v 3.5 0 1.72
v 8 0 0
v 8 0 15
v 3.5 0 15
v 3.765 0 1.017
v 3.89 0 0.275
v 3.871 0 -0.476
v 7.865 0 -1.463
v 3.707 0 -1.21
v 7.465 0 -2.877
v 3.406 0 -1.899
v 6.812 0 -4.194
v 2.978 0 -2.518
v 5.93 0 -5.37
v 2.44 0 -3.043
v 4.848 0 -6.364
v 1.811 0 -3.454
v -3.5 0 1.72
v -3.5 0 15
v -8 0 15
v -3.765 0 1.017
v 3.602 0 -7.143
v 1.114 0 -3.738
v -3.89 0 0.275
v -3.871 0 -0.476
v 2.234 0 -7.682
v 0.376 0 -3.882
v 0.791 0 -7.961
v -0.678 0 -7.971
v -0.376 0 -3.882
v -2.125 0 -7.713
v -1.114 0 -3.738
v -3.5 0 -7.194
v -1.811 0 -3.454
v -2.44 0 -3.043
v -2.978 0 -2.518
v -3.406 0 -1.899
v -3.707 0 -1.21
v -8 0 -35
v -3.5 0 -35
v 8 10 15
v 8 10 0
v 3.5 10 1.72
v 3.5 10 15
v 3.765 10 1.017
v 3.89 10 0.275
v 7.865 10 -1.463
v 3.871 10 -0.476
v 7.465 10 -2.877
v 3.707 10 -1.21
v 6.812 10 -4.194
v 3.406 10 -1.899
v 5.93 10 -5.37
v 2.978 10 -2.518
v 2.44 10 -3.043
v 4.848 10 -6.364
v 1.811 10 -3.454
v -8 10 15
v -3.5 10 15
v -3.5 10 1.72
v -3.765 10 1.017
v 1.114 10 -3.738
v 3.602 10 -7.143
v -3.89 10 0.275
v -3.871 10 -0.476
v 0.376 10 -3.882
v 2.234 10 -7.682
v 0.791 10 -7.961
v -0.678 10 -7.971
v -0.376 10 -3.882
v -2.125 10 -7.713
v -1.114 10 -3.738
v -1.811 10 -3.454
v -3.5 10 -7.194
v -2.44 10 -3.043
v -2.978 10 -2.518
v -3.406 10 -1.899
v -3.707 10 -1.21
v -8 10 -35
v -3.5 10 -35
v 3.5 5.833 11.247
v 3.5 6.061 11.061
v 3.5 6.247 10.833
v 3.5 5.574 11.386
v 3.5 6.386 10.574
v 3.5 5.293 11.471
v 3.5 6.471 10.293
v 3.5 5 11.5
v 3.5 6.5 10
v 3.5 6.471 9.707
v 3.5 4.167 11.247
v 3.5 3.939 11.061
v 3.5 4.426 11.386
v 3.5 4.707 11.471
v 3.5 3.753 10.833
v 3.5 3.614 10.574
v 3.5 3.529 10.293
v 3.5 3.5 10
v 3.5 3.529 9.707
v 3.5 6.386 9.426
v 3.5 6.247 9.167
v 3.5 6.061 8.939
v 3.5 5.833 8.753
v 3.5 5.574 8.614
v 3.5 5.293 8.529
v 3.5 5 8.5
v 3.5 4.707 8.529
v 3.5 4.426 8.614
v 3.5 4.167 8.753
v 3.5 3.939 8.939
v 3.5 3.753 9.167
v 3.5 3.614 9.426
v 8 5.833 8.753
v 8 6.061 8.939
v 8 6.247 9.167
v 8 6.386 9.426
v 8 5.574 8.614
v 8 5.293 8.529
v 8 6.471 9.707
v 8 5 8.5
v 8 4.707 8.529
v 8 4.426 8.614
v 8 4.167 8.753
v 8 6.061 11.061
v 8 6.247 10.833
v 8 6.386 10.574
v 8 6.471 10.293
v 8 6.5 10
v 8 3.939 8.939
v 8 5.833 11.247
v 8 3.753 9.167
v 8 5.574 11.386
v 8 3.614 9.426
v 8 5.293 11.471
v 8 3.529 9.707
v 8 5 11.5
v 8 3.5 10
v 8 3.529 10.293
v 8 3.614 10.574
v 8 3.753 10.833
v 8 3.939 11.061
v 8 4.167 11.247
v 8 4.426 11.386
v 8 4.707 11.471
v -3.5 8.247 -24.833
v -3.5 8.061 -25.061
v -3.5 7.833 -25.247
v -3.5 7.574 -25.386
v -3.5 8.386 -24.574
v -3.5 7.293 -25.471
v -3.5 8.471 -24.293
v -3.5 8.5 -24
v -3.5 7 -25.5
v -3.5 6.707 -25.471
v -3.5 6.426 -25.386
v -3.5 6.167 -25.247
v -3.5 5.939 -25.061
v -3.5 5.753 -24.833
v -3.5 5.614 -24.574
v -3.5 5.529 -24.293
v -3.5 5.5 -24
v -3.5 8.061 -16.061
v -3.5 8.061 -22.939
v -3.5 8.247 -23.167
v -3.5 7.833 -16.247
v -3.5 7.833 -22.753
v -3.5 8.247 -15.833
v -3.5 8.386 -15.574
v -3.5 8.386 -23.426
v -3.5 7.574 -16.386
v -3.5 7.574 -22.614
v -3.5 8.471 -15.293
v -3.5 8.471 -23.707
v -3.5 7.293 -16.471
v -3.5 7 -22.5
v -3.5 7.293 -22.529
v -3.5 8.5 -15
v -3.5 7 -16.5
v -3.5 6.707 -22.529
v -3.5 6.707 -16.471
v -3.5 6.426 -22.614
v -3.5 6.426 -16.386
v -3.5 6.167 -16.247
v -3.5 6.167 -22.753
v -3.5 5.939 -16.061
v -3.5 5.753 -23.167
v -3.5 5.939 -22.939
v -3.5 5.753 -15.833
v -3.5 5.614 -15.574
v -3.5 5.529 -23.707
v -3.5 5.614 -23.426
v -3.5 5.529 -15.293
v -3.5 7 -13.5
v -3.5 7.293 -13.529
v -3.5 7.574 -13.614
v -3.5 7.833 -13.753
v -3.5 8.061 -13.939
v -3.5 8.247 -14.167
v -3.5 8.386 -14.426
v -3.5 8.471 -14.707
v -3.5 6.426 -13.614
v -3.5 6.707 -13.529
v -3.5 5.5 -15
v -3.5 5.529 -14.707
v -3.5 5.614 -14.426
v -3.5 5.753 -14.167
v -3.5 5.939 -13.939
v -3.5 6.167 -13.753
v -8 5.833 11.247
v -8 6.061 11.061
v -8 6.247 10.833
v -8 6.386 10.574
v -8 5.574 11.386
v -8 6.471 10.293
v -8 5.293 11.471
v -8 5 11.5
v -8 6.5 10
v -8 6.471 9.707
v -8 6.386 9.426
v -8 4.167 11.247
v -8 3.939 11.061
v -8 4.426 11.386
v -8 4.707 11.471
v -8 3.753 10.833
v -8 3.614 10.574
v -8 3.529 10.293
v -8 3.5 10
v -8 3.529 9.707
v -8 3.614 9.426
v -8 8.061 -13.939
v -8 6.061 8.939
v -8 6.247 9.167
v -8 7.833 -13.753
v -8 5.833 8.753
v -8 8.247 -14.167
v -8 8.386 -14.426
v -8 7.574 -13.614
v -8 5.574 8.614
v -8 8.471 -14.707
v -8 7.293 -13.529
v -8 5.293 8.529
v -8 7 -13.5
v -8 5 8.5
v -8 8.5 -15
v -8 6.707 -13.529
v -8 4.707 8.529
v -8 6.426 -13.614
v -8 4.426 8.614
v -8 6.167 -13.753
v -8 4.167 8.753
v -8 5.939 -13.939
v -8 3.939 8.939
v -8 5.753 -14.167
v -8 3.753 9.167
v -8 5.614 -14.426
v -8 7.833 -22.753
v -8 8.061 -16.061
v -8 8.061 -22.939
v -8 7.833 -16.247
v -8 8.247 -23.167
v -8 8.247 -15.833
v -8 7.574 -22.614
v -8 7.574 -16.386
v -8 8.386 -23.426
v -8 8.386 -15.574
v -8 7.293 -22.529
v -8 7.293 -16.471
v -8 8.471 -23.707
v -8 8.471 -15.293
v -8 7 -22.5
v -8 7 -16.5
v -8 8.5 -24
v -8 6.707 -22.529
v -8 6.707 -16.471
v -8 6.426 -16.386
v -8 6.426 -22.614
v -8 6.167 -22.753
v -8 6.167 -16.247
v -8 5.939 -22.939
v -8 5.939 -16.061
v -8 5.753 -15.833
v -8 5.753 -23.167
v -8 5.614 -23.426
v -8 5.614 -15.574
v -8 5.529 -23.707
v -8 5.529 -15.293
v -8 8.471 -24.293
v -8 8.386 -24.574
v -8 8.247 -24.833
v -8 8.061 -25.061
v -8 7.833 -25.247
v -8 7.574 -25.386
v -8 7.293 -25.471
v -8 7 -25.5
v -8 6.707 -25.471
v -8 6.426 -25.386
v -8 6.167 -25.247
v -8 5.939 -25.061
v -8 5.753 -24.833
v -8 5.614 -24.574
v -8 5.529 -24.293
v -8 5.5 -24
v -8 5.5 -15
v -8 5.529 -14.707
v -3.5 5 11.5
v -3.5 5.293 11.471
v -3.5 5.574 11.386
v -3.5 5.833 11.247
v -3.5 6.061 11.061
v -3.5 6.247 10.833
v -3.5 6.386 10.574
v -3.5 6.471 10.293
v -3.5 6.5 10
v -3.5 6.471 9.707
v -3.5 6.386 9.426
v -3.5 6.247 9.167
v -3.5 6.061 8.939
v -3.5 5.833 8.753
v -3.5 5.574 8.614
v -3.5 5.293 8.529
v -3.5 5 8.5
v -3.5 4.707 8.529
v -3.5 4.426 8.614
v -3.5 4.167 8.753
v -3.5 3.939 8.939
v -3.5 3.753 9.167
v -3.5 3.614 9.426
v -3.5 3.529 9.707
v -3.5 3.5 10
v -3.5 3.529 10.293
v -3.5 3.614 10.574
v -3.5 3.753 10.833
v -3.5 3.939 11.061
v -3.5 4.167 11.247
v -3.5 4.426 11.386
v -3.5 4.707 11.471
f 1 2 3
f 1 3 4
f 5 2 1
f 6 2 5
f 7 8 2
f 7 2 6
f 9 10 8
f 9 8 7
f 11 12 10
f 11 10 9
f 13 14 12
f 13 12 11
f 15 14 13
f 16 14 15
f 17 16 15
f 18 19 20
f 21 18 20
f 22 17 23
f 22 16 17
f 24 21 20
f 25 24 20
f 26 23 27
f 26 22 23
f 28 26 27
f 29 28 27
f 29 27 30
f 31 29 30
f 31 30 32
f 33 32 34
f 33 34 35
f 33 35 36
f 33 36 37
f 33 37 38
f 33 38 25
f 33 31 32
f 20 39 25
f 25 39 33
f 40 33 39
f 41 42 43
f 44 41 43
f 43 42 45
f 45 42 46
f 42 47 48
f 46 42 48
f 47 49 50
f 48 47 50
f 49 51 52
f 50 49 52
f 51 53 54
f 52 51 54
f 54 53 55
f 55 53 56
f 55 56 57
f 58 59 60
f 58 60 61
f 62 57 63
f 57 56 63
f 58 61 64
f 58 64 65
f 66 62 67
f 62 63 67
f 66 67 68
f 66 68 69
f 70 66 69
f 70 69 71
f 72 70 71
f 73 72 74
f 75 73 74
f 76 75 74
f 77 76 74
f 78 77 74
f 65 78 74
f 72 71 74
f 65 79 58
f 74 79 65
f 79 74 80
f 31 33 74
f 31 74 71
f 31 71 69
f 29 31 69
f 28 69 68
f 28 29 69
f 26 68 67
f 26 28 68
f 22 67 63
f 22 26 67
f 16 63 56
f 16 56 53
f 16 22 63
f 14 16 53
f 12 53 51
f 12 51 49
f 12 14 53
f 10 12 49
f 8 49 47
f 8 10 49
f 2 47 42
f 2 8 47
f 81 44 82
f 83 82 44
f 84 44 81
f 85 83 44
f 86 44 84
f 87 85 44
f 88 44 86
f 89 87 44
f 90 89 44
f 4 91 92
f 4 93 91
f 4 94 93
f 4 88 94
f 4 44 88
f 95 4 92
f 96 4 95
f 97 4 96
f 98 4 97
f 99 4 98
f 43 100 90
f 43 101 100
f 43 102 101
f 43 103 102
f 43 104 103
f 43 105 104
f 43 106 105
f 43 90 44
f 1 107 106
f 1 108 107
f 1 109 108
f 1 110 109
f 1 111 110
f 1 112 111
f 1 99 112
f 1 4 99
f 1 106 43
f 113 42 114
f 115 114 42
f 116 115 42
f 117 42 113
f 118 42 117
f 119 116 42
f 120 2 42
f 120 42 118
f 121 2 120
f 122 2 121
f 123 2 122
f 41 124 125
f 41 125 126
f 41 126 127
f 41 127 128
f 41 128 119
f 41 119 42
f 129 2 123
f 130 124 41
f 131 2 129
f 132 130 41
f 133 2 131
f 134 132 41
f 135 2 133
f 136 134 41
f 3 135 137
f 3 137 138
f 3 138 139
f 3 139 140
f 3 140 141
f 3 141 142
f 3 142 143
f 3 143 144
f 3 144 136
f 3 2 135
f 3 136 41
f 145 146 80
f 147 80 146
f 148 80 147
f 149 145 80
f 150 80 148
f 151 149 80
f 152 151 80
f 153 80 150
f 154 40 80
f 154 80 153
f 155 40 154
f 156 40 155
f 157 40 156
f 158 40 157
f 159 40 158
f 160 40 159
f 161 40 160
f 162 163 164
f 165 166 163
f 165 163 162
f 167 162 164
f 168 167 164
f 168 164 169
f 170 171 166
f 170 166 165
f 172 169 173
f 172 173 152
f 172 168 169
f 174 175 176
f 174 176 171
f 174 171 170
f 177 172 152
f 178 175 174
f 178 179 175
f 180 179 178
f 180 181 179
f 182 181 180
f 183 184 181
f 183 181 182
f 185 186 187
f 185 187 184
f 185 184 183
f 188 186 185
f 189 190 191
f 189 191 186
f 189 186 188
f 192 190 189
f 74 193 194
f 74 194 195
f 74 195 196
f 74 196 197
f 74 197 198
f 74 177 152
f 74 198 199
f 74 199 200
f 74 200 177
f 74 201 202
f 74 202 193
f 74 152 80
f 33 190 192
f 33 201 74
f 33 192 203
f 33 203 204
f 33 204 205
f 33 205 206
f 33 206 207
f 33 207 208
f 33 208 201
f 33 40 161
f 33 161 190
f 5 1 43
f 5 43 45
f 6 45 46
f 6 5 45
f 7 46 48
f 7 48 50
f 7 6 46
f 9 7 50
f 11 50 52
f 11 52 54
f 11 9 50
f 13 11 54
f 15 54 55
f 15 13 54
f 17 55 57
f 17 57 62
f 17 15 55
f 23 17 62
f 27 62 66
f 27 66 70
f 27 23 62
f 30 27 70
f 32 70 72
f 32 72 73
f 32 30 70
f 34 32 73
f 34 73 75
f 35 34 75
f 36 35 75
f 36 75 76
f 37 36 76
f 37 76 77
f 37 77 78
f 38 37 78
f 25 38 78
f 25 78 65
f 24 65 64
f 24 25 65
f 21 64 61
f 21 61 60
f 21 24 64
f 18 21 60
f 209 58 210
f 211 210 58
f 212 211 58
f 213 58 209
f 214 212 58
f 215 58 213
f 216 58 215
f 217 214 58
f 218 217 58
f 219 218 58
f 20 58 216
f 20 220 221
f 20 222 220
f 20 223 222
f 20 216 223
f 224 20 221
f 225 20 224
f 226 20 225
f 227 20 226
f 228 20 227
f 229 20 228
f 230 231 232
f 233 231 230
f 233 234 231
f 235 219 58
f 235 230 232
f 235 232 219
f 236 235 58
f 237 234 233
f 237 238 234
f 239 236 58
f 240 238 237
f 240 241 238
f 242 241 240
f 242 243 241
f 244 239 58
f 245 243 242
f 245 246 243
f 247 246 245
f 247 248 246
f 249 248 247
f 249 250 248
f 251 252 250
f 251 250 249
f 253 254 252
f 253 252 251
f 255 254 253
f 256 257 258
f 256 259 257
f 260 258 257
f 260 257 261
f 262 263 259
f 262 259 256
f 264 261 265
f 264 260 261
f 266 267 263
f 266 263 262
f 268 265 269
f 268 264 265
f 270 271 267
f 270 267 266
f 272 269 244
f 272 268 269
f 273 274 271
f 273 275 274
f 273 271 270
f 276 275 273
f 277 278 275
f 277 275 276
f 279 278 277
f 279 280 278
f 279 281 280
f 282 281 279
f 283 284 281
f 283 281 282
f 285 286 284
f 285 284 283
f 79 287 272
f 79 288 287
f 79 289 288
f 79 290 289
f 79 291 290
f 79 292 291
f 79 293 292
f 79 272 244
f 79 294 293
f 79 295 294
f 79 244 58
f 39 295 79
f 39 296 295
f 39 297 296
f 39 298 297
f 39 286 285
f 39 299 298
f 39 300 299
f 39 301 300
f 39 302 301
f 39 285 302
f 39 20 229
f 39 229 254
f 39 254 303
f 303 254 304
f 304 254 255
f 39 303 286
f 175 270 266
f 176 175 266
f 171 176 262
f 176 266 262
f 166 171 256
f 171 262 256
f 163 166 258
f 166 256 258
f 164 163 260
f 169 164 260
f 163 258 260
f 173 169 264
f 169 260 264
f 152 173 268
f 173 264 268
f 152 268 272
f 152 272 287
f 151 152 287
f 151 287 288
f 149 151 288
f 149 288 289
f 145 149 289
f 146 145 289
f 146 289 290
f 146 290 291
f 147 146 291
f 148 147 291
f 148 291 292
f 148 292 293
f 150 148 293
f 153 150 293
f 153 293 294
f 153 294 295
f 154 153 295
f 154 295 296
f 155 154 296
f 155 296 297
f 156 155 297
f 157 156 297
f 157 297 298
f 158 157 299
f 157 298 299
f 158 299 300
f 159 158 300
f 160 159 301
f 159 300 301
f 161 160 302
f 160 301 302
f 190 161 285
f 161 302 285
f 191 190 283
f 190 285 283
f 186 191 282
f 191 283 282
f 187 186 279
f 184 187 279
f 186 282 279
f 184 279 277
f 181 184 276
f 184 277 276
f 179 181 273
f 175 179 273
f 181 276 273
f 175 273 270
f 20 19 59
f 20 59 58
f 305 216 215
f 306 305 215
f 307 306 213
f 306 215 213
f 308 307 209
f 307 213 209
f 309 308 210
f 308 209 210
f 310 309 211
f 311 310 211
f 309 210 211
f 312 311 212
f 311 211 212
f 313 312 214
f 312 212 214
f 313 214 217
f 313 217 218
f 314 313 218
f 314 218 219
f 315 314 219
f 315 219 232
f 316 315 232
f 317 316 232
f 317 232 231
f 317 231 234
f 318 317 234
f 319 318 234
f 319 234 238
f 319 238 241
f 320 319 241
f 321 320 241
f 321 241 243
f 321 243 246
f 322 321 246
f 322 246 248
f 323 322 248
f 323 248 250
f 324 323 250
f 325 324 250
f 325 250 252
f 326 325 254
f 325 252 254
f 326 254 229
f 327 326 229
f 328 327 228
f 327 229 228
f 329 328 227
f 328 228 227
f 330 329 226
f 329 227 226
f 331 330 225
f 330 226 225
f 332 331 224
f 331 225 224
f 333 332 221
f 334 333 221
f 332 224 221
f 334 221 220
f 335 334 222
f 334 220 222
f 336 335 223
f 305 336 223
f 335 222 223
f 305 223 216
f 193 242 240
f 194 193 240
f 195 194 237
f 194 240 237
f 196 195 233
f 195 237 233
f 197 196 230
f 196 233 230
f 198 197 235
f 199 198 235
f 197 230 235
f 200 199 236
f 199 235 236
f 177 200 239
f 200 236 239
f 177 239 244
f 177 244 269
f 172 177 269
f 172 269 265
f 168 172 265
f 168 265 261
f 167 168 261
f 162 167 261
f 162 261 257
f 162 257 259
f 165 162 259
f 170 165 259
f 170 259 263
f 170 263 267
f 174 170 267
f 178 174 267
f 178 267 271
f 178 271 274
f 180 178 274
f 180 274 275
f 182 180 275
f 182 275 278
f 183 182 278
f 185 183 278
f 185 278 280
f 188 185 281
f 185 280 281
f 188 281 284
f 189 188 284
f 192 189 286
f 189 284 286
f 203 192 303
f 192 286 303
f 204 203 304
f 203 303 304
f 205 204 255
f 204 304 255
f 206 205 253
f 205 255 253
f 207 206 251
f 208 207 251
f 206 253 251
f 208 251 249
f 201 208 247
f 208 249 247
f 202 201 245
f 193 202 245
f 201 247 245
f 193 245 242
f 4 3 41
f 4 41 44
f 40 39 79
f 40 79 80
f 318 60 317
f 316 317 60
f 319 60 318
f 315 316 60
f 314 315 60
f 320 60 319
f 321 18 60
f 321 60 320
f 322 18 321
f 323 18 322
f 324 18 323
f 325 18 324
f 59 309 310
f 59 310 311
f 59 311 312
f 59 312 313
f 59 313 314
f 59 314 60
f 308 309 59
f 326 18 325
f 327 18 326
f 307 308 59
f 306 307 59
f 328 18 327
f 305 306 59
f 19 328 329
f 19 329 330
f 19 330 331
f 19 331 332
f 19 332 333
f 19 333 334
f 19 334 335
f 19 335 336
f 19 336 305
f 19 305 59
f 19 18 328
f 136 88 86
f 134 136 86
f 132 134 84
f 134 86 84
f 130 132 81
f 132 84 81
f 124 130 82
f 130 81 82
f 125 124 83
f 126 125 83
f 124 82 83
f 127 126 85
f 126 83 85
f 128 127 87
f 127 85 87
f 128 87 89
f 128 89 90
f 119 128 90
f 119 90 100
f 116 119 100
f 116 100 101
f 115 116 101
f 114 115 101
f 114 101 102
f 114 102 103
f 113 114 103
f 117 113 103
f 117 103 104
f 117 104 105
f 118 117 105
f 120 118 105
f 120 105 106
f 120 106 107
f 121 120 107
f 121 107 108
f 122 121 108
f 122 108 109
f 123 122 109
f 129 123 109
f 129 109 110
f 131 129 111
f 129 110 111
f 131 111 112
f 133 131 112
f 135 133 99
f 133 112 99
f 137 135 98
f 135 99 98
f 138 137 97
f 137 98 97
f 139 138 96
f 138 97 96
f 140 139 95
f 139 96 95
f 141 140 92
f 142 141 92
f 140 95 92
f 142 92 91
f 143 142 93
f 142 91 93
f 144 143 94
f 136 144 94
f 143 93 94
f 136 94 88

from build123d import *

# Parameters (mm, degrees)
BOSS_EXTRUDE1_DEPTH = 10
SKETCH2_R           = 1.5
CUT_EXTRUDE1_DEPTH  = 40.761790704
SKETCH3_R           = 1.5
CUT_EXTRUDE2_DEPTH  = 40.761790704


with BuildPart() as part:
    # Sketch1 → Boss-Extrude1 (new body)
    with BuildSketch(Plane(origin=(0, 0, 0), x_dir=(1, 0, 0), z_dir=(0, 1, 0))):
        with BuildLine():
            Line((-8, -15), (-8, 35))
            Line((-8, 35), (-3.5, 35))
            Line((-3.5, 35), (-3.5, 7.193747285))
            ThreePointArc((-3.5, 7.193747285), (4.242640687, 6.782329983), (8, 0))
            Line((8, 0), (8, -15))
            Line((8, -15), (3.5, -15))
            Line((3.5, -15), (3.5, -1.720465053))
            ThreePointArc((3.5, -1.720465053), (0, 3.9), (-3.5, -1.720465053))
            Line((-3.5, -1.720465053), (-3.5, -15))
            Line((-3.5, -15), (-8, -15))
        make_face()
    extrude(amount=BOSS_EXTRUDE1_DEPTH)

    # Sketch2 → Cut-Extrude1 (cut, through all)
    with BuildSketch(Plane.ZY.offset(8)):
        with Locations((10, 5)):
            Circle(SKETCH2_R)
    extrude(amount=-CUT_EXTRUDE1_DEPTH, mode=Mode.SUBTRACT)

    # Sketch3 → Cut-Extrude2 (cut, through all)
    with BuildSketch(Plane.ZY.offset(8)):
        with Locations((-24, 7)):
            Circle(SKETCH3_R)
        with Locations((-15, 7)):
            Circle(SKETCH3_R)
    extrude(amount=-CUT_EXTRUDE2_DEPTH, mode=Mode.SUBTRACT)


solid = part.part
